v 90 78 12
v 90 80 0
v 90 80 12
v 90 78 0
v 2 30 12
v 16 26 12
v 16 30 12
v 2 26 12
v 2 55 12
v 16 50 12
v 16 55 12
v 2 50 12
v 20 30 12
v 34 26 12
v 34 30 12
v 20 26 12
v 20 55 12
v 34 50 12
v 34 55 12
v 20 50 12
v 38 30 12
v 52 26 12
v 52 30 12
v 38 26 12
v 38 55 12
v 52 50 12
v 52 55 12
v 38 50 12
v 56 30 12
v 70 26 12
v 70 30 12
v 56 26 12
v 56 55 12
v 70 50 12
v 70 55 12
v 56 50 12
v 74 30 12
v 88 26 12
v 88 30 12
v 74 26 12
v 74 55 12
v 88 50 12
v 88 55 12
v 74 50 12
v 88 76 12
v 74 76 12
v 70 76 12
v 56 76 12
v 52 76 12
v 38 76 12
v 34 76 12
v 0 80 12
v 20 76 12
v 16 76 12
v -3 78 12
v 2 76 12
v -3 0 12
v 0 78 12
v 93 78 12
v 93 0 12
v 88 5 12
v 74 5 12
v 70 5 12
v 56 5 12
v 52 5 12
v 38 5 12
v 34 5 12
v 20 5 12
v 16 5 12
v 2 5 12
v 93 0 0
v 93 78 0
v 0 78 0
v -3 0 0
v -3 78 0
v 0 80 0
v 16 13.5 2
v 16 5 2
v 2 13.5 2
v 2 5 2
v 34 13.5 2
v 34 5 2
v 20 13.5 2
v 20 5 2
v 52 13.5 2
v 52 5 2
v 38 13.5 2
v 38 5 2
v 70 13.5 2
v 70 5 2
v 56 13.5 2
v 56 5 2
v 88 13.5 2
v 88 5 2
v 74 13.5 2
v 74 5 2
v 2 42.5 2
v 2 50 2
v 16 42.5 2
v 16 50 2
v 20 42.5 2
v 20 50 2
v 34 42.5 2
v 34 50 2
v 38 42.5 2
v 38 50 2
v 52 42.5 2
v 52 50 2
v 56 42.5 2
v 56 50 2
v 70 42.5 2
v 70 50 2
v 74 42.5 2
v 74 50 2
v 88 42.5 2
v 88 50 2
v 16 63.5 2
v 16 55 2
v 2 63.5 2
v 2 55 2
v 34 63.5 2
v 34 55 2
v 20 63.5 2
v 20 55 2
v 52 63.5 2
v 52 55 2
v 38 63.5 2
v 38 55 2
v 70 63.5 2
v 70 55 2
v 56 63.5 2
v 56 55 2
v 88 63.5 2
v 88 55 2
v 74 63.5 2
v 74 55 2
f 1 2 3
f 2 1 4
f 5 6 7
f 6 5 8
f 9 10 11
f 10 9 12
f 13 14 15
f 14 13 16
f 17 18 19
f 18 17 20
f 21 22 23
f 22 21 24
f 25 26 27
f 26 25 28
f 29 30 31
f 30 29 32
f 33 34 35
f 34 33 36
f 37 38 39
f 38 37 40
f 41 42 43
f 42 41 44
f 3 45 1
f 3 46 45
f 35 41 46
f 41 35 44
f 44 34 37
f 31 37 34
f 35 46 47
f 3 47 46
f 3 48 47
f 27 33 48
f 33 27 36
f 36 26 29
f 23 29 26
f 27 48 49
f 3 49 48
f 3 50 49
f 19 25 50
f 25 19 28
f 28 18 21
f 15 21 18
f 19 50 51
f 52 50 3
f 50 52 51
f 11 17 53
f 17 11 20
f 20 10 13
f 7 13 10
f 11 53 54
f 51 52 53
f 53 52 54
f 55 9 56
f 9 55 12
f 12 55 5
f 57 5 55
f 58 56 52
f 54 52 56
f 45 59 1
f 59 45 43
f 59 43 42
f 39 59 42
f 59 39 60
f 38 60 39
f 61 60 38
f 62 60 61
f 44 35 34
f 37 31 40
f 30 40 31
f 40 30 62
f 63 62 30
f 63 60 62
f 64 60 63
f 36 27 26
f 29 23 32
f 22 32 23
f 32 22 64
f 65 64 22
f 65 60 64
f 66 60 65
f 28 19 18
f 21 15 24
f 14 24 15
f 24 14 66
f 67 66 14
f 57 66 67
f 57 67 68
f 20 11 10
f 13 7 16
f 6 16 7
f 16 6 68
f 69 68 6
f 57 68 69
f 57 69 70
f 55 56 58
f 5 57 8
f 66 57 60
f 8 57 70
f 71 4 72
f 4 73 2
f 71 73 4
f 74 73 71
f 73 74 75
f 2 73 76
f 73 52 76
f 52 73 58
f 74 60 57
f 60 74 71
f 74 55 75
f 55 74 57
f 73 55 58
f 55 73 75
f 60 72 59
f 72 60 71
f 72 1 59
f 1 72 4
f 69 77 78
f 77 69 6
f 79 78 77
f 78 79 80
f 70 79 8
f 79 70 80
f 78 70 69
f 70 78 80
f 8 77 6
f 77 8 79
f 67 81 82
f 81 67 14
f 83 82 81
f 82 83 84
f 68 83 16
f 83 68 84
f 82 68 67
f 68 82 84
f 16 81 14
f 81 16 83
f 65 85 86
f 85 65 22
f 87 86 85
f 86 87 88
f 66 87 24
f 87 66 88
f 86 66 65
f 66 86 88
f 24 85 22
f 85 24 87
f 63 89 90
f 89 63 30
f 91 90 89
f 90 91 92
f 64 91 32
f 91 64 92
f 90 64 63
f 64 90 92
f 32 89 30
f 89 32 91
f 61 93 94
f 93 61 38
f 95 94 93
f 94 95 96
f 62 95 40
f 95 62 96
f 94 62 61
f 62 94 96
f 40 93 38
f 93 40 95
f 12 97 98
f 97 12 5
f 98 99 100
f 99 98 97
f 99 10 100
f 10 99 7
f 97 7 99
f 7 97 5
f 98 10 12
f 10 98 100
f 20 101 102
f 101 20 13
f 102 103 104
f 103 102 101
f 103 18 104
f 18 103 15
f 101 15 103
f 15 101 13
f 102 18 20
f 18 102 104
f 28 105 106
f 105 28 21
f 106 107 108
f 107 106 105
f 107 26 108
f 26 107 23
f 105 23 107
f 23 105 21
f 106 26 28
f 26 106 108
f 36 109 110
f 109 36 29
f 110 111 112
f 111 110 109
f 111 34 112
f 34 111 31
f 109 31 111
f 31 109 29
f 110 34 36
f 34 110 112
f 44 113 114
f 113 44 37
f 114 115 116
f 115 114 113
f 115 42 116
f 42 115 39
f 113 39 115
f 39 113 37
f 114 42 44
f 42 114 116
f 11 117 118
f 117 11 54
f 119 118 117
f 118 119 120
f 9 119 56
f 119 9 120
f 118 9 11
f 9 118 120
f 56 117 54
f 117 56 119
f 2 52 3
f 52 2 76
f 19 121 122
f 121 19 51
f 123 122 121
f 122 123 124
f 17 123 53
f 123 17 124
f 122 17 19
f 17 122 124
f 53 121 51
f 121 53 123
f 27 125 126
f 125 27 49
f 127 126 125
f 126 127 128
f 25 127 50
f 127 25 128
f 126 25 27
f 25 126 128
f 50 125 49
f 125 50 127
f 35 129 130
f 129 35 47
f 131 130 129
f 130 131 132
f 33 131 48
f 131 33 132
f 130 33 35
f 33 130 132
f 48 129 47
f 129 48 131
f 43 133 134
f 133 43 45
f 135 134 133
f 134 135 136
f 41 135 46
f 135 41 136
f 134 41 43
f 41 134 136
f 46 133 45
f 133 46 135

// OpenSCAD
// Rows of paint wells for the tray
rows = 3;
// Paint wells in each row
wellsPerRow = 5;
// Wall width of paint well exterior
wellWidth = 18;
// Wall length of paint well exterior
wellLength = 25;
// Wall height of paint well exterior
wellHeight = 12;
// Wall thickness of paint well interior
wellThickness = 2;
// Thickness of border between rows and around tray edge
borderThickness = 3;

module paintwell(width,length,height,thickness) {
    // 45 degree right triangle
    polyhedron(points = [
        [thickness,length/2 - thickness,thickness], //0
        [thickness,length - thickness,thickness], //1
        [thickness,length - thickness,height], //2
        [width - thickness,length/2 - thickness,thickness], //3
        [width - thickness,length - thickness,thickness], //4
        [width - thickness,length - thickness,height] //5
    ], faces = [
        [0,3,4,1], //bottom
        [2,5,3,0], //front
        [5,2,1,4], //back
        [5,4,3], //right
        [1,2,0] //left
    ], convexity = 10);

    difference() {
        cube([width, length, height]);

        translate([thickness,thickness,thickness])
            cube([width-thickness*2,length-thickness*2,height]);
    }
}

module trayBorder(width,length,height,thickness,rows,columns) {
    cube([width*columns,thickness,height]);
    translate([-thickness,0,0])
        cube([thickness,length*rows + thickness,height]);
    translate([width*columns,0,0])
        cube([thickness,length*rows + thickness,height]);
}

module paintTray(rows=2, wellsPerRow=5, wellWidth=18, wellLength=25, wellHeight=12, wellThickness=2, borderThickness=3) {
    trayBorder(wellWidth,wellLength,wellHeight,borderThickness,rows,wellsPerRow);

    for(i = [1:rows], j = [1:wellsPerRow]) {
        if(i % 2 == 1) { // odd
            translate([wellWidth*(j-1),wellLength*(i-1)+borderThickness,0]) {
                paintwell(width = wellWidth,length = wellLength,height = wellHeight,thickness = wellThickness);
            }
            translate([wellWidth*(j-1),wellLength*(i)+wellThickness,0])
                cube([wellWidth,borderThickness,wellHeight]);
        } else {
            translate([wellWidth*(j),wellLength*i+borderThickness,0]) rotate([0,0,180]) {
                paintwell(width = wellWidth,length = wellLength,height = wellHeight,thickness = wellThickness);
                cube([wellWidth,borderThickness,wellHeight]);
            }
        }
    }
}

paintTray(rows,wellsPerRow,wellWidth,wellLength,wellHeight,wellThickness,borderThickness);
